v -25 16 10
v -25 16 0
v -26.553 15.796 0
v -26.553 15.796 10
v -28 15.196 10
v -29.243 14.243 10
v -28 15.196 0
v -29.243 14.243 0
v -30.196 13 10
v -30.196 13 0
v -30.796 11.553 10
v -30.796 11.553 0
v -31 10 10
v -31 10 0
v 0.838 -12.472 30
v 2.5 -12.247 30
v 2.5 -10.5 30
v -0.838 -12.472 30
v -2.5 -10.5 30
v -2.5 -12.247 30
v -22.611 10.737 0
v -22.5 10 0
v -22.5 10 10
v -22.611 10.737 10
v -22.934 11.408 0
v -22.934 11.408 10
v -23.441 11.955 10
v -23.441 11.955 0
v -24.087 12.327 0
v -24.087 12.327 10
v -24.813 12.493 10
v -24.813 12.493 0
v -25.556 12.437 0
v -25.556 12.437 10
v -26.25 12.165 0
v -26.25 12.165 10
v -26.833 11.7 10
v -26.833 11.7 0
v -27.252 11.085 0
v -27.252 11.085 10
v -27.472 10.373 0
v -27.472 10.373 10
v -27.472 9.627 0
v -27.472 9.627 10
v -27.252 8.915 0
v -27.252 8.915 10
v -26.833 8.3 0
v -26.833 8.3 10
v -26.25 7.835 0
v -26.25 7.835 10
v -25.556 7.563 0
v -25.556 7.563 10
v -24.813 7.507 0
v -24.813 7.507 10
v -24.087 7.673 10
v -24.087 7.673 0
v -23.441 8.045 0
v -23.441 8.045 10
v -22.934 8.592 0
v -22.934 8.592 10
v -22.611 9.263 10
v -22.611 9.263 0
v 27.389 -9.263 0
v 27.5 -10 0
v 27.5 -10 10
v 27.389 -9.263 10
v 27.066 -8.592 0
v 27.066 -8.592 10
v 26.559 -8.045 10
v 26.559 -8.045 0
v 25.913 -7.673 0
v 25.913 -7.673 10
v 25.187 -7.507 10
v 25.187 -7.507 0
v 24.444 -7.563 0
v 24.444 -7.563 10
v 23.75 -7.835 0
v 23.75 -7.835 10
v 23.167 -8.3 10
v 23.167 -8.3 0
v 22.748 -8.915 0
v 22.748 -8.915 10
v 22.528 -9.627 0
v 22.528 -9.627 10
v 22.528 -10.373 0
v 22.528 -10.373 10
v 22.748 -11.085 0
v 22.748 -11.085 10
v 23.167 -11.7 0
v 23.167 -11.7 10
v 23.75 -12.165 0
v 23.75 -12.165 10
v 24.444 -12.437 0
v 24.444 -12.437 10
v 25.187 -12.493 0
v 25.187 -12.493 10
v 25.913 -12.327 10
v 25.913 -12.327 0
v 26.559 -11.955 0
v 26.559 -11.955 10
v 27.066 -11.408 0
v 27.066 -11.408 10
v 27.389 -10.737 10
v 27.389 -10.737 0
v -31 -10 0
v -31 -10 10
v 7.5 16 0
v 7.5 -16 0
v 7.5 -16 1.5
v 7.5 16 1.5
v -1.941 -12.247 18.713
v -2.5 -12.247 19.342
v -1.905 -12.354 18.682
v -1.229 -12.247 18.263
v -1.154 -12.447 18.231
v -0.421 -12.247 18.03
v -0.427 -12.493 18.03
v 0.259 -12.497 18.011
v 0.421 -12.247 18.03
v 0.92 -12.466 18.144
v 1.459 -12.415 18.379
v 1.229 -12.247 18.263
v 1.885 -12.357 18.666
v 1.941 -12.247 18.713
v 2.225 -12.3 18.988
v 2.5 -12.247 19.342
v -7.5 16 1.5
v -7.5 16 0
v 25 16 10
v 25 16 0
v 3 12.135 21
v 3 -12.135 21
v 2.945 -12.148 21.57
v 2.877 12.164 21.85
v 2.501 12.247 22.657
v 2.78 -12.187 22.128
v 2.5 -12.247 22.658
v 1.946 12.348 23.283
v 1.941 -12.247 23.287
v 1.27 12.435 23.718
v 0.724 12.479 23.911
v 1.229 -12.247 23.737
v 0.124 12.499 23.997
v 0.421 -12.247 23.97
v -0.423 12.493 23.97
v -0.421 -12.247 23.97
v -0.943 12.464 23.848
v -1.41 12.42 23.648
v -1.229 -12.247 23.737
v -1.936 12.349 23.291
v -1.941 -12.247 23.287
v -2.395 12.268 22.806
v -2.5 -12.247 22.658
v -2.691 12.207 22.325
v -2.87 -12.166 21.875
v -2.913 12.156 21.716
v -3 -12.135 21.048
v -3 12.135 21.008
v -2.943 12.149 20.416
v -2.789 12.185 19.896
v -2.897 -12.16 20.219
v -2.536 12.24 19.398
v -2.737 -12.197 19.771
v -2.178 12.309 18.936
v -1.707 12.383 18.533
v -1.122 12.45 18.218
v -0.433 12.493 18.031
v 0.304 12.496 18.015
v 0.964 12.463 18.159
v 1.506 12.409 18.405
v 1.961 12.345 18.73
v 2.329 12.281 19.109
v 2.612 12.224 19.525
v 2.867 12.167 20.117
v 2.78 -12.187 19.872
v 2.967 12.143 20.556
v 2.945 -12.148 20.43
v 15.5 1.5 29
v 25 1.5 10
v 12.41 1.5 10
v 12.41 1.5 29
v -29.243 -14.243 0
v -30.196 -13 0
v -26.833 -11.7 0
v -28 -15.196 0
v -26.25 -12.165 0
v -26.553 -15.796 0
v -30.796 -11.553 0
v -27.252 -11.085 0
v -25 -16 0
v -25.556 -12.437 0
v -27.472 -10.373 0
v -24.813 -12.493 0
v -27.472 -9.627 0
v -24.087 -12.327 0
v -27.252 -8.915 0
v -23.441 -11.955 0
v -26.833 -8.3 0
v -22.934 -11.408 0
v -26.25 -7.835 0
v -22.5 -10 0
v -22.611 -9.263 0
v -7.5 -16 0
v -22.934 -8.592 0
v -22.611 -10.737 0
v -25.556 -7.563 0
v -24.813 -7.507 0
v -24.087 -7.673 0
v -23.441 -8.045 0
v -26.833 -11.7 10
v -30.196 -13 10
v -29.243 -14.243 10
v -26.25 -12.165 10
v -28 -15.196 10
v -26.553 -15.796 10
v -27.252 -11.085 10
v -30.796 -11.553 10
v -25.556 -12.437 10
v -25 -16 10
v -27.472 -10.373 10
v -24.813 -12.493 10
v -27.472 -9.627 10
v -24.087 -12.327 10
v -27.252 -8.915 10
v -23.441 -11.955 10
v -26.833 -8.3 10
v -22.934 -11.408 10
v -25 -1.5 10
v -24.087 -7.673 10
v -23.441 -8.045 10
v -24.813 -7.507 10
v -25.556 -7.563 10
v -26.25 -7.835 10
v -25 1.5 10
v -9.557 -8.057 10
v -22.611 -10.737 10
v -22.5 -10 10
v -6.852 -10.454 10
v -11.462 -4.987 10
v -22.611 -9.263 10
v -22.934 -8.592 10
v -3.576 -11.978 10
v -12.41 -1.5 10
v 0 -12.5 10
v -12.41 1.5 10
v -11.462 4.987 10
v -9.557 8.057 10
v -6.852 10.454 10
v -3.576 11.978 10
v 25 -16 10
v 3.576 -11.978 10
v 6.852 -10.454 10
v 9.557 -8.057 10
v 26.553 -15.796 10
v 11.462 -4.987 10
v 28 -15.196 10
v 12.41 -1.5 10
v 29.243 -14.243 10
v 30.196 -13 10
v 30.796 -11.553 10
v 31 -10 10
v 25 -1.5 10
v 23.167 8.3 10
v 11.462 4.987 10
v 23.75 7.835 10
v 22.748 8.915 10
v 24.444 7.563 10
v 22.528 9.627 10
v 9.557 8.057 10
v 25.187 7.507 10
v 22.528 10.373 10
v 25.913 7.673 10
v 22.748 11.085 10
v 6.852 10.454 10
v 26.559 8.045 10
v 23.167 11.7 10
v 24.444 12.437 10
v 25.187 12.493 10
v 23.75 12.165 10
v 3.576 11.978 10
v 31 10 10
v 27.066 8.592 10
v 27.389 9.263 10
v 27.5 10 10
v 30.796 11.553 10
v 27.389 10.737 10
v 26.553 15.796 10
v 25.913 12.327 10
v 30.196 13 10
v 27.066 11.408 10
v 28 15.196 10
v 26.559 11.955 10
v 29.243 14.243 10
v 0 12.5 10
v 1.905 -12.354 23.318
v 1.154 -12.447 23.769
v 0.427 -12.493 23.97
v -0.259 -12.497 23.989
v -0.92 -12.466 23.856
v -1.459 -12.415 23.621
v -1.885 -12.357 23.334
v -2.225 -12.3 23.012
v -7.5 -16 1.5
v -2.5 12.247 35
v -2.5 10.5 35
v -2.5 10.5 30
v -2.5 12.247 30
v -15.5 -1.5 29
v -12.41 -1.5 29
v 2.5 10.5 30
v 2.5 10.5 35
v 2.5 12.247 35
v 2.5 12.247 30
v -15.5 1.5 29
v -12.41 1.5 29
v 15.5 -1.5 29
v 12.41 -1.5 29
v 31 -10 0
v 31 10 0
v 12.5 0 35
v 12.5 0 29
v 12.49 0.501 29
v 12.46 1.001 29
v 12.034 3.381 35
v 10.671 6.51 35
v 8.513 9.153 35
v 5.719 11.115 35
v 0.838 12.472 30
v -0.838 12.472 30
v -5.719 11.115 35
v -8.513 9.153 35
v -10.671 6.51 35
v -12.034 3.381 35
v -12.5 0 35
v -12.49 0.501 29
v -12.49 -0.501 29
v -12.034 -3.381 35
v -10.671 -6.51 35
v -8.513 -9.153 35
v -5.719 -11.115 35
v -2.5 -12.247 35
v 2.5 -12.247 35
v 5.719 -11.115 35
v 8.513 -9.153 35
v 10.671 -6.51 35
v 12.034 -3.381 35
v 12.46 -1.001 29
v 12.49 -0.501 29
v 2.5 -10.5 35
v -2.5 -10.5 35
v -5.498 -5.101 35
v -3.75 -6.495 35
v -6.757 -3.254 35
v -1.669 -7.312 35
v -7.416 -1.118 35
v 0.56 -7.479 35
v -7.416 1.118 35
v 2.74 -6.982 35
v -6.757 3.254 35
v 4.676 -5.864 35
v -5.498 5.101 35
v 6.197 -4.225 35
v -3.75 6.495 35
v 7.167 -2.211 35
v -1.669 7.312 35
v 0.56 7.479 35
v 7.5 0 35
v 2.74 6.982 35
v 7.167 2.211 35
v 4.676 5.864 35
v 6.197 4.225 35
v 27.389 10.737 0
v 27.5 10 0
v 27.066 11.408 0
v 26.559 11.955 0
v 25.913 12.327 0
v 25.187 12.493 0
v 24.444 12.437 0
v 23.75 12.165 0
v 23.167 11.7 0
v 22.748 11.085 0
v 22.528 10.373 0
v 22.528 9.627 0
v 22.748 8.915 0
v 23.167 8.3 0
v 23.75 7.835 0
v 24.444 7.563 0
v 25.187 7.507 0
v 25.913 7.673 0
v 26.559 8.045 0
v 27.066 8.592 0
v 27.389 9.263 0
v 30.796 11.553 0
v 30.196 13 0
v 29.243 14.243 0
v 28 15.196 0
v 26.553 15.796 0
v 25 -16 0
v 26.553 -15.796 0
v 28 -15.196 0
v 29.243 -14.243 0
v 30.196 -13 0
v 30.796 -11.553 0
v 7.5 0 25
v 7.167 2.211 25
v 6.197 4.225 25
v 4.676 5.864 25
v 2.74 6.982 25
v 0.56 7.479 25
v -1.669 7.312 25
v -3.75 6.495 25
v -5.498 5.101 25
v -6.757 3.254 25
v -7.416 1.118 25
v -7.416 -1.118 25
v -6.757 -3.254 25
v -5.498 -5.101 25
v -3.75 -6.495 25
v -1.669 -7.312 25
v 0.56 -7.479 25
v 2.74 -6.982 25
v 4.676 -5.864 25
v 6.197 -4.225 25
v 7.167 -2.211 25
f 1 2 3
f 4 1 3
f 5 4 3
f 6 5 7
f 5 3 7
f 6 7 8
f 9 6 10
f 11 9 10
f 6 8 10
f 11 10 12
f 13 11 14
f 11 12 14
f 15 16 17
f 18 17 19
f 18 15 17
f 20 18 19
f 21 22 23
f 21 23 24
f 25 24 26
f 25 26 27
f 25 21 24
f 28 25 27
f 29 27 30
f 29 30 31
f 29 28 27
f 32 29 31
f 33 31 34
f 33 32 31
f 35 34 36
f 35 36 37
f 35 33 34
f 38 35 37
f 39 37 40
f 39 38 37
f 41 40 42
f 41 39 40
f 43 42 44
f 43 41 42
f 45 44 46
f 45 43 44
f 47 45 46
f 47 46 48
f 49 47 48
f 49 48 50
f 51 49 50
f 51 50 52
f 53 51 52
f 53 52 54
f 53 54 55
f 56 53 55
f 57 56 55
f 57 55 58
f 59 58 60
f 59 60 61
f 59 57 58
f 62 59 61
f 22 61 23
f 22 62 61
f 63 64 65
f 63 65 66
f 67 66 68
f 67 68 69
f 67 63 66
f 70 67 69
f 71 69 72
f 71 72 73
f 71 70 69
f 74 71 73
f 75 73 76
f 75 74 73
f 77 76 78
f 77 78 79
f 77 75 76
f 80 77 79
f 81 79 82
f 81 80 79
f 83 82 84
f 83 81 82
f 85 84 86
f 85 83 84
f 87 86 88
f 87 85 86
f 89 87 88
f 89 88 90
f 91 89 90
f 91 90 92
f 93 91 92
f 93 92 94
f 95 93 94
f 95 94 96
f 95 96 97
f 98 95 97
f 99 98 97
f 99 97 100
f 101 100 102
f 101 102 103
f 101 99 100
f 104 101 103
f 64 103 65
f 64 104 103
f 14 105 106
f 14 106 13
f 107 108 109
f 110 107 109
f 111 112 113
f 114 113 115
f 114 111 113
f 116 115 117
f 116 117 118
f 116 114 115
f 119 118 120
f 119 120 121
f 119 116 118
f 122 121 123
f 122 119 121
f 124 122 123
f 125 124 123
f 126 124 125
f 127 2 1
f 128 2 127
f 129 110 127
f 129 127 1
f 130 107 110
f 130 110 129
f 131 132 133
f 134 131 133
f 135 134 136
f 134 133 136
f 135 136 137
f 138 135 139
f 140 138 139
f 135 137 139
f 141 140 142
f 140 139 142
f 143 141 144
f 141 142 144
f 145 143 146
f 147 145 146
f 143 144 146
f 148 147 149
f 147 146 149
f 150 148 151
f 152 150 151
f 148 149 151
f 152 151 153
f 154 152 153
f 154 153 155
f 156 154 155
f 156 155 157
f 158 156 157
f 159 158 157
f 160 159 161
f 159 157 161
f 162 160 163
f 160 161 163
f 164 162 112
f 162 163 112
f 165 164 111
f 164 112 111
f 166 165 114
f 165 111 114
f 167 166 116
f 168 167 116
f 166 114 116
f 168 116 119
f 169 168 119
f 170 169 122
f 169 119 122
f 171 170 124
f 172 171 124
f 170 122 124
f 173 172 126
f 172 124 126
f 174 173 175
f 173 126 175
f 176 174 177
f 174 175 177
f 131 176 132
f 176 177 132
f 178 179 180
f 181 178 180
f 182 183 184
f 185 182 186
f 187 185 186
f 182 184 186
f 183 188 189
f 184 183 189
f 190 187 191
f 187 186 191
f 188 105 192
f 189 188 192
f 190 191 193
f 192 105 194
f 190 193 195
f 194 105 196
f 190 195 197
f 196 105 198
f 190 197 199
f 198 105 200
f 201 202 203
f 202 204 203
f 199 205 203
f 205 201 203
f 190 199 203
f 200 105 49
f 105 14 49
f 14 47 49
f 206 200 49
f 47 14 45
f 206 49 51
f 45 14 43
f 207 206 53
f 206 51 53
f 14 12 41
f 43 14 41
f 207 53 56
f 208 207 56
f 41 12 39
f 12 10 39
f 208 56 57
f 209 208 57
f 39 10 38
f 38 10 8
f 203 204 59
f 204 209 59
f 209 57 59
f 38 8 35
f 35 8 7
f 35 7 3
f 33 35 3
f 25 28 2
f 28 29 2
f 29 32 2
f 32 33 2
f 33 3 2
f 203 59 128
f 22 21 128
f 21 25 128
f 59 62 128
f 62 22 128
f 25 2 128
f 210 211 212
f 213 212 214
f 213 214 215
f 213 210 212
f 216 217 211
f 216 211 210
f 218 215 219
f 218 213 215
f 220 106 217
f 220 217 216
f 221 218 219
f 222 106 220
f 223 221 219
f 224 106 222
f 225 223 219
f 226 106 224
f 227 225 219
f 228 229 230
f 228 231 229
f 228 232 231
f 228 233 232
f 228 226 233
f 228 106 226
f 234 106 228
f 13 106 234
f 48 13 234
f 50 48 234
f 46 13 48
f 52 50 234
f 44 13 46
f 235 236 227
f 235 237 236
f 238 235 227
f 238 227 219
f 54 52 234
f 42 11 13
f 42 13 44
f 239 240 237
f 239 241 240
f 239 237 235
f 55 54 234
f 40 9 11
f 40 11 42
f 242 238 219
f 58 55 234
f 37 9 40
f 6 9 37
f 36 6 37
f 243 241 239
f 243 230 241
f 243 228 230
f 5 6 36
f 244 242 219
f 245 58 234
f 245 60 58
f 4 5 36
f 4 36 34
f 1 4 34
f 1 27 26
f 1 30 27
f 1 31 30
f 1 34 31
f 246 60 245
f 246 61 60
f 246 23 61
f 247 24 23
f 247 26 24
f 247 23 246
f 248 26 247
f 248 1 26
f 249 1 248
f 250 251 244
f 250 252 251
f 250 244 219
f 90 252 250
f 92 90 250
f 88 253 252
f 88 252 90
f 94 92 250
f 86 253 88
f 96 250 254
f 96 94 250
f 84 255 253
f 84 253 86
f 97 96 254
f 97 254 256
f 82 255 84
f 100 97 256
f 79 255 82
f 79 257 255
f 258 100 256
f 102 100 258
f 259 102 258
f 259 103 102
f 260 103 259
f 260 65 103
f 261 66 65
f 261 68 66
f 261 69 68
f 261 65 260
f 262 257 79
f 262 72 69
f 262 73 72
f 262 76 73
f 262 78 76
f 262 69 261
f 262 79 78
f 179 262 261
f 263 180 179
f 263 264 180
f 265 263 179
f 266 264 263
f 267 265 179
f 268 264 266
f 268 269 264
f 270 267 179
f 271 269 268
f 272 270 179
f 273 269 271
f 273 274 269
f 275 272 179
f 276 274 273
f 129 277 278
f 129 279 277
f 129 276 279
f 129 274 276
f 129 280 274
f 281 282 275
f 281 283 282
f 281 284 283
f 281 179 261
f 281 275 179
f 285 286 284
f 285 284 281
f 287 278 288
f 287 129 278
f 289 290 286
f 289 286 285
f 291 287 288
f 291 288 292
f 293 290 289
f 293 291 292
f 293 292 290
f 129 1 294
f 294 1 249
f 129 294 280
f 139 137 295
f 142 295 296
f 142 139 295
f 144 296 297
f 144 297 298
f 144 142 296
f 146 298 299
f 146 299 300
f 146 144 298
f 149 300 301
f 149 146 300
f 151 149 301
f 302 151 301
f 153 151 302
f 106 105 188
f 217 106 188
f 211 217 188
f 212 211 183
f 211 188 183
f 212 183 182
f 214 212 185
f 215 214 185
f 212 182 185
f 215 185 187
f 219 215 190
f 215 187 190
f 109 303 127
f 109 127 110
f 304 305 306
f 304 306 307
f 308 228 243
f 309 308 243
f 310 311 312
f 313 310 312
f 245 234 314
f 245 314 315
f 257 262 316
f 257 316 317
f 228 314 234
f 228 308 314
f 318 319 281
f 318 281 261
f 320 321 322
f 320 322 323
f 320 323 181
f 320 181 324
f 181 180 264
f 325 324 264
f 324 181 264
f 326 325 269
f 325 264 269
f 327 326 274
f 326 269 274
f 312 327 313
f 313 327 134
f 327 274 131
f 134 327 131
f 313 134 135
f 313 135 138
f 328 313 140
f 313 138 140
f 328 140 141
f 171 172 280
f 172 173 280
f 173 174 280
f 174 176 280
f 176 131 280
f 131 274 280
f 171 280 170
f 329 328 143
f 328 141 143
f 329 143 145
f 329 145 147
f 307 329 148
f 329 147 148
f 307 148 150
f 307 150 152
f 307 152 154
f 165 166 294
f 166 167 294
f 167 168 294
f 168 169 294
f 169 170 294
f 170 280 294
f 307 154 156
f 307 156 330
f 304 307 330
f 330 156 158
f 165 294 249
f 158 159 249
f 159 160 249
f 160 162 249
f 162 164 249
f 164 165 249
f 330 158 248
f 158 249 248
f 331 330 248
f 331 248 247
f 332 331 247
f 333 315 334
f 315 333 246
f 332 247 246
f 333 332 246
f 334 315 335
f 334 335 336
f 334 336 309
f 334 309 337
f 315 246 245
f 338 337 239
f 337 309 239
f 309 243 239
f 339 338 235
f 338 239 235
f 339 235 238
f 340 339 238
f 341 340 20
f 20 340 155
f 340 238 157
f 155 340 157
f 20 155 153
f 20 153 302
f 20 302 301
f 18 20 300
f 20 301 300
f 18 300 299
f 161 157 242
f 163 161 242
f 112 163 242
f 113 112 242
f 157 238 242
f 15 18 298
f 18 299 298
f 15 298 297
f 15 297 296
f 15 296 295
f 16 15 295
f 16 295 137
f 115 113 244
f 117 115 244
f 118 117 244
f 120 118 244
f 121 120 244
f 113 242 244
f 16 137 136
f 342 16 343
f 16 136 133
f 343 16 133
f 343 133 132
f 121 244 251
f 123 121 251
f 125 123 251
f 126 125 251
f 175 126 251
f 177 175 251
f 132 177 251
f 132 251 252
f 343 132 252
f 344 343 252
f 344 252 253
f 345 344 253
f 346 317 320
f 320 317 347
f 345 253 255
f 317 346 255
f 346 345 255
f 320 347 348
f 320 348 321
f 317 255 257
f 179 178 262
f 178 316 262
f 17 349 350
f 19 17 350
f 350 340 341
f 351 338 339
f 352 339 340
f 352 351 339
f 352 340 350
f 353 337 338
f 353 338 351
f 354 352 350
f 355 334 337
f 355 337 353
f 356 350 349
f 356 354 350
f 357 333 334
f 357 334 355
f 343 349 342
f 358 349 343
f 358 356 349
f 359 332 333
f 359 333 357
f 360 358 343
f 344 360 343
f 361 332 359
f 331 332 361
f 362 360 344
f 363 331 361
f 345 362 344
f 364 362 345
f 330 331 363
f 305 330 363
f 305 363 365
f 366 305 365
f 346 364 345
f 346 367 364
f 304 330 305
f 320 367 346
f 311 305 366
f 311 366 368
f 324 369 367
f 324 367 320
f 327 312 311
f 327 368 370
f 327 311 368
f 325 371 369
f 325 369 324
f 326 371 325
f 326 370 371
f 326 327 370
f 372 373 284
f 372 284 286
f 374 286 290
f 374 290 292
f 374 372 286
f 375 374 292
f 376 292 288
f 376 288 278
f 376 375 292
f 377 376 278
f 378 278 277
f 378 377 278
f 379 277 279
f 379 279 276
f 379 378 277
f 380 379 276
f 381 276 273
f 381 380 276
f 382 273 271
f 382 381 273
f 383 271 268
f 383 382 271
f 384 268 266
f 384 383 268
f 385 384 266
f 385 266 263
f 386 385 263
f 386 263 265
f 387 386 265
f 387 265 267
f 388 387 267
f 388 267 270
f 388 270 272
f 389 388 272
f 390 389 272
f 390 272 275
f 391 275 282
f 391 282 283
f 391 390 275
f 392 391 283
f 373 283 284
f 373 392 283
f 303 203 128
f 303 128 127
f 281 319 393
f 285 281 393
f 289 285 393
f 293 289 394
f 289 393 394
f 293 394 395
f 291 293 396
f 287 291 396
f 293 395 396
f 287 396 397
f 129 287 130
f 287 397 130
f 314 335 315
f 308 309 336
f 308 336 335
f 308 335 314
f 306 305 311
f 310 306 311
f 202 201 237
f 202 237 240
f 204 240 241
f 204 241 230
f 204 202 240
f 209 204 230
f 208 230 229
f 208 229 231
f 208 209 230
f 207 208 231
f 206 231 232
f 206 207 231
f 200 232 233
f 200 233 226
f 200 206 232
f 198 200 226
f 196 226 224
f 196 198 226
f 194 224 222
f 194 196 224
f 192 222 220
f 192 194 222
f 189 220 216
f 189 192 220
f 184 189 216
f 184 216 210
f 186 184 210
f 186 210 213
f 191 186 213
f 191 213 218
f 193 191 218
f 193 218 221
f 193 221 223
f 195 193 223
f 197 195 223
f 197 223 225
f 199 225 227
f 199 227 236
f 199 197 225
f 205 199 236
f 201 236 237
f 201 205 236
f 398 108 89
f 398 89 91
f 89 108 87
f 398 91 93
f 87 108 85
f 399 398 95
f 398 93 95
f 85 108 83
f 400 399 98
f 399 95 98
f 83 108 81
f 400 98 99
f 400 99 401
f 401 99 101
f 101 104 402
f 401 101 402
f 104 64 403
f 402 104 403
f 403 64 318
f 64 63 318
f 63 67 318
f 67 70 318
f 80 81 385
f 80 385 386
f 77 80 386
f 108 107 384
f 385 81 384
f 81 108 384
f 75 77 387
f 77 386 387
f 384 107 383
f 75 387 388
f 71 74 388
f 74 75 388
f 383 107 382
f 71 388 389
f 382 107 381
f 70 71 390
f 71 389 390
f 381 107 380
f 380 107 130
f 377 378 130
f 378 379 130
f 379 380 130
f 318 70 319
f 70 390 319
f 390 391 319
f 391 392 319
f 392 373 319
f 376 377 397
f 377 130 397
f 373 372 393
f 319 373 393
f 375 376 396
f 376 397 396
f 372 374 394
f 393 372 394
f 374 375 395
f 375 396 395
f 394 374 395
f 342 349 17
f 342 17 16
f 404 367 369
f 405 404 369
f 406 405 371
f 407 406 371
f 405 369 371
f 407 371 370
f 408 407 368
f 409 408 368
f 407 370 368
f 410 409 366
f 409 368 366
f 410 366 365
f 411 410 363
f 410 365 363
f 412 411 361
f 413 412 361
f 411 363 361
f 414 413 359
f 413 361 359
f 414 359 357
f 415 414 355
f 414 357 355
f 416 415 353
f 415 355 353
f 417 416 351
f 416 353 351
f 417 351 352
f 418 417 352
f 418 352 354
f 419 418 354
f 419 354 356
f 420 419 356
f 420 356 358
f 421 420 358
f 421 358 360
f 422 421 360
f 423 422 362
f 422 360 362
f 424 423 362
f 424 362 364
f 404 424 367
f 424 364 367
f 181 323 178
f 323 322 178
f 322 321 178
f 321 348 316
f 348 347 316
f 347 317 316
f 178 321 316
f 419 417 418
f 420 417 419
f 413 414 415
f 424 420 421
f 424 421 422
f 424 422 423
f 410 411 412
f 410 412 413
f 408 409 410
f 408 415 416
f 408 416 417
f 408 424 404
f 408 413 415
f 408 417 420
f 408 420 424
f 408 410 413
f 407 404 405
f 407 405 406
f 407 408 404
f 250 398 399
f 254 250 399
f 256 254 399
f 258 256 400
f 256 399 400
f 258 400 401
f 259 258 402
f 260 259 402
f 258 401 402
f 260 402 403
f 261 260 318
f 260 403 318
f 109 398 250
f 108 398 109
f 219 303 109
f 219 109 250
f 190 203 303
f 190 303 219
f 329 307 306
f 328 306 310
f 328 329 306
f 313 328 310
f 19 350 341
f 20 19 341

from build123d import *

# Parameters (mm, degrees)
SKETCH_R             = 2.5
PAD_DEPTH            = 10
SKETCH001_R          = 12.5
PAD001_DEPTH         = 25
SKETCH002_R          = 7.5
POCKET_DEPTH         = 10
SKETCH003_W          = 5
SKETCH003_H          = 3.523945
POCKET001_DEPTH      = 5
POLARPATTERN_COUNT   = 2
PAD002_DEPTH         = 1.5
SKETCH005_R          = 3
POCKET002_DEPTH      = 28.248449
POCKET002_DEPTH_BACK = -3.753551
SKETCH006_W          = 15
SKETCH006_H          = 3
POCKET003_DEPTH      = 32.001


with BuildPart() as part:
    # Sketch → Pad (new body)
    with BuildSketch(Plane.XY):
        with BuildLine():
            ThreePointArc((-25, 16), (-29.242641, 14.242641), (-31, 10))
            Line((-31, -10), (-31, 10))
            ThreePointArc((-31, -10), (-29.242641, -14.242641), (-25, -16))
            Line((25, -16), (-25, -16))
            ThreePointArc((25, -16), (29.242641, -14.242641), (31, -10))
            Line((31, 10), (31, -10))
            ThreePointArc((31, 10), (29.242641, 14.242641), (25, 16))
            Line((-25, 16), (25, 16))
        make_face()
        with Locations((-25, -10)):
            Circle(SKETCH_R, mode=Mode.SUBTRACT)
        with Locations((-25, 10)):
            Circle(SKETCH_R, mode=Mode.SUBTRACT)
        with Locations((25, -10)):
            Circle(SKETCH_R, mode=Mode.SUBTRACT)
        with Locations((25, 10)):
            Circle(SKETCH_R, mode=Mode.SUBTRACT)
    extrude(amount=PAD_DEPTH)

    # Sketch001 (on Face14 of Pad) → Pad001 (join)
    with BuildSketch(Plane.XY.offset(10)):
        Circle(SKETCH001_R)
    extrude(amount=PAD001_DEPTH)

    # Sketch002 (on Face16 of Pad001) → Pocket (cut)
    with BuildSketch(Plane.XY.offset(35)):
        Circle(SKETCH002_R)
    extrude(amount=-POCKET_DEPTH, mode=Mode.SUBTRACT)

    # Sketch003 (on Face16 of Pocket) → Pocket001 (cut)
    with BuildSketch(Plane.XY.offset(35)):
        with Locations((0, 12.261972)):
            Rectangle(SKETCH003_W, SKETCH003_H)
    pocket001 = extrude(amount=-POCKET001_DEPTH, mode=Mode.SUBTRACT)

    # PolarPattern: Pocket001 ×2 about axis
    polarpattern_axis = Axis((0, 0, 35), (0, 0, 1))
    for i in range(1, POLARPATTERN_COUNT):
        add(pocket001.rotate(polarpattern_axis, i * 360 / POLARPATTERN_COUNT), mode=Mode.SUBTRACT)

    # Sketch004 (on DatumPlane) → Pad002 (join, symmetric)
    with BuildSketch(Plane(origin=(12.5, 0, 35), x_dir=(1, 0, 0), z_dir=(0, -1, 0))):
        Polygon((-0.2, -6), (3, -6), (12.5, -25), (-0.2, -25), align=None)
    pad002 = extrude(amount=PAD002_DEPTH, both=True)

    # Mirrored: Pad002 across YZ
    add(pad002.mirror(Plane.YZ))

    # Sketch005 (on DatumPlane) → Pocket002 (cut, two sides)
    with BuildSketch(Plane(origin=(0, -12.247449, 30), x_dir=(1, 0, 0), z_dir=(0, -1, 0))) as pocket002_sk:
        with Locations((0, -9)):
            Circle(SKETCH005_R)
    extrude(amount=-POCKET002_DEPTH, mode=Mode.SUBTRACT)
    extrude(pocket002_sk.sketch, amount=-POCKET002_DEPTH_BACK, mode=Mode.SUBTRACT)

    # Sketch006 (on Face8 of Pocket002) → Pocket003 (cut, through all)
    with BuildSketch(Plane.XZ.offset(16)):
        Rectangle(SKETCH006_W, SKETCH006_H)
    extrude(amount=-POCKET003_DEPTH, mode=Mode.SUBTRACT)


solid = part.part
